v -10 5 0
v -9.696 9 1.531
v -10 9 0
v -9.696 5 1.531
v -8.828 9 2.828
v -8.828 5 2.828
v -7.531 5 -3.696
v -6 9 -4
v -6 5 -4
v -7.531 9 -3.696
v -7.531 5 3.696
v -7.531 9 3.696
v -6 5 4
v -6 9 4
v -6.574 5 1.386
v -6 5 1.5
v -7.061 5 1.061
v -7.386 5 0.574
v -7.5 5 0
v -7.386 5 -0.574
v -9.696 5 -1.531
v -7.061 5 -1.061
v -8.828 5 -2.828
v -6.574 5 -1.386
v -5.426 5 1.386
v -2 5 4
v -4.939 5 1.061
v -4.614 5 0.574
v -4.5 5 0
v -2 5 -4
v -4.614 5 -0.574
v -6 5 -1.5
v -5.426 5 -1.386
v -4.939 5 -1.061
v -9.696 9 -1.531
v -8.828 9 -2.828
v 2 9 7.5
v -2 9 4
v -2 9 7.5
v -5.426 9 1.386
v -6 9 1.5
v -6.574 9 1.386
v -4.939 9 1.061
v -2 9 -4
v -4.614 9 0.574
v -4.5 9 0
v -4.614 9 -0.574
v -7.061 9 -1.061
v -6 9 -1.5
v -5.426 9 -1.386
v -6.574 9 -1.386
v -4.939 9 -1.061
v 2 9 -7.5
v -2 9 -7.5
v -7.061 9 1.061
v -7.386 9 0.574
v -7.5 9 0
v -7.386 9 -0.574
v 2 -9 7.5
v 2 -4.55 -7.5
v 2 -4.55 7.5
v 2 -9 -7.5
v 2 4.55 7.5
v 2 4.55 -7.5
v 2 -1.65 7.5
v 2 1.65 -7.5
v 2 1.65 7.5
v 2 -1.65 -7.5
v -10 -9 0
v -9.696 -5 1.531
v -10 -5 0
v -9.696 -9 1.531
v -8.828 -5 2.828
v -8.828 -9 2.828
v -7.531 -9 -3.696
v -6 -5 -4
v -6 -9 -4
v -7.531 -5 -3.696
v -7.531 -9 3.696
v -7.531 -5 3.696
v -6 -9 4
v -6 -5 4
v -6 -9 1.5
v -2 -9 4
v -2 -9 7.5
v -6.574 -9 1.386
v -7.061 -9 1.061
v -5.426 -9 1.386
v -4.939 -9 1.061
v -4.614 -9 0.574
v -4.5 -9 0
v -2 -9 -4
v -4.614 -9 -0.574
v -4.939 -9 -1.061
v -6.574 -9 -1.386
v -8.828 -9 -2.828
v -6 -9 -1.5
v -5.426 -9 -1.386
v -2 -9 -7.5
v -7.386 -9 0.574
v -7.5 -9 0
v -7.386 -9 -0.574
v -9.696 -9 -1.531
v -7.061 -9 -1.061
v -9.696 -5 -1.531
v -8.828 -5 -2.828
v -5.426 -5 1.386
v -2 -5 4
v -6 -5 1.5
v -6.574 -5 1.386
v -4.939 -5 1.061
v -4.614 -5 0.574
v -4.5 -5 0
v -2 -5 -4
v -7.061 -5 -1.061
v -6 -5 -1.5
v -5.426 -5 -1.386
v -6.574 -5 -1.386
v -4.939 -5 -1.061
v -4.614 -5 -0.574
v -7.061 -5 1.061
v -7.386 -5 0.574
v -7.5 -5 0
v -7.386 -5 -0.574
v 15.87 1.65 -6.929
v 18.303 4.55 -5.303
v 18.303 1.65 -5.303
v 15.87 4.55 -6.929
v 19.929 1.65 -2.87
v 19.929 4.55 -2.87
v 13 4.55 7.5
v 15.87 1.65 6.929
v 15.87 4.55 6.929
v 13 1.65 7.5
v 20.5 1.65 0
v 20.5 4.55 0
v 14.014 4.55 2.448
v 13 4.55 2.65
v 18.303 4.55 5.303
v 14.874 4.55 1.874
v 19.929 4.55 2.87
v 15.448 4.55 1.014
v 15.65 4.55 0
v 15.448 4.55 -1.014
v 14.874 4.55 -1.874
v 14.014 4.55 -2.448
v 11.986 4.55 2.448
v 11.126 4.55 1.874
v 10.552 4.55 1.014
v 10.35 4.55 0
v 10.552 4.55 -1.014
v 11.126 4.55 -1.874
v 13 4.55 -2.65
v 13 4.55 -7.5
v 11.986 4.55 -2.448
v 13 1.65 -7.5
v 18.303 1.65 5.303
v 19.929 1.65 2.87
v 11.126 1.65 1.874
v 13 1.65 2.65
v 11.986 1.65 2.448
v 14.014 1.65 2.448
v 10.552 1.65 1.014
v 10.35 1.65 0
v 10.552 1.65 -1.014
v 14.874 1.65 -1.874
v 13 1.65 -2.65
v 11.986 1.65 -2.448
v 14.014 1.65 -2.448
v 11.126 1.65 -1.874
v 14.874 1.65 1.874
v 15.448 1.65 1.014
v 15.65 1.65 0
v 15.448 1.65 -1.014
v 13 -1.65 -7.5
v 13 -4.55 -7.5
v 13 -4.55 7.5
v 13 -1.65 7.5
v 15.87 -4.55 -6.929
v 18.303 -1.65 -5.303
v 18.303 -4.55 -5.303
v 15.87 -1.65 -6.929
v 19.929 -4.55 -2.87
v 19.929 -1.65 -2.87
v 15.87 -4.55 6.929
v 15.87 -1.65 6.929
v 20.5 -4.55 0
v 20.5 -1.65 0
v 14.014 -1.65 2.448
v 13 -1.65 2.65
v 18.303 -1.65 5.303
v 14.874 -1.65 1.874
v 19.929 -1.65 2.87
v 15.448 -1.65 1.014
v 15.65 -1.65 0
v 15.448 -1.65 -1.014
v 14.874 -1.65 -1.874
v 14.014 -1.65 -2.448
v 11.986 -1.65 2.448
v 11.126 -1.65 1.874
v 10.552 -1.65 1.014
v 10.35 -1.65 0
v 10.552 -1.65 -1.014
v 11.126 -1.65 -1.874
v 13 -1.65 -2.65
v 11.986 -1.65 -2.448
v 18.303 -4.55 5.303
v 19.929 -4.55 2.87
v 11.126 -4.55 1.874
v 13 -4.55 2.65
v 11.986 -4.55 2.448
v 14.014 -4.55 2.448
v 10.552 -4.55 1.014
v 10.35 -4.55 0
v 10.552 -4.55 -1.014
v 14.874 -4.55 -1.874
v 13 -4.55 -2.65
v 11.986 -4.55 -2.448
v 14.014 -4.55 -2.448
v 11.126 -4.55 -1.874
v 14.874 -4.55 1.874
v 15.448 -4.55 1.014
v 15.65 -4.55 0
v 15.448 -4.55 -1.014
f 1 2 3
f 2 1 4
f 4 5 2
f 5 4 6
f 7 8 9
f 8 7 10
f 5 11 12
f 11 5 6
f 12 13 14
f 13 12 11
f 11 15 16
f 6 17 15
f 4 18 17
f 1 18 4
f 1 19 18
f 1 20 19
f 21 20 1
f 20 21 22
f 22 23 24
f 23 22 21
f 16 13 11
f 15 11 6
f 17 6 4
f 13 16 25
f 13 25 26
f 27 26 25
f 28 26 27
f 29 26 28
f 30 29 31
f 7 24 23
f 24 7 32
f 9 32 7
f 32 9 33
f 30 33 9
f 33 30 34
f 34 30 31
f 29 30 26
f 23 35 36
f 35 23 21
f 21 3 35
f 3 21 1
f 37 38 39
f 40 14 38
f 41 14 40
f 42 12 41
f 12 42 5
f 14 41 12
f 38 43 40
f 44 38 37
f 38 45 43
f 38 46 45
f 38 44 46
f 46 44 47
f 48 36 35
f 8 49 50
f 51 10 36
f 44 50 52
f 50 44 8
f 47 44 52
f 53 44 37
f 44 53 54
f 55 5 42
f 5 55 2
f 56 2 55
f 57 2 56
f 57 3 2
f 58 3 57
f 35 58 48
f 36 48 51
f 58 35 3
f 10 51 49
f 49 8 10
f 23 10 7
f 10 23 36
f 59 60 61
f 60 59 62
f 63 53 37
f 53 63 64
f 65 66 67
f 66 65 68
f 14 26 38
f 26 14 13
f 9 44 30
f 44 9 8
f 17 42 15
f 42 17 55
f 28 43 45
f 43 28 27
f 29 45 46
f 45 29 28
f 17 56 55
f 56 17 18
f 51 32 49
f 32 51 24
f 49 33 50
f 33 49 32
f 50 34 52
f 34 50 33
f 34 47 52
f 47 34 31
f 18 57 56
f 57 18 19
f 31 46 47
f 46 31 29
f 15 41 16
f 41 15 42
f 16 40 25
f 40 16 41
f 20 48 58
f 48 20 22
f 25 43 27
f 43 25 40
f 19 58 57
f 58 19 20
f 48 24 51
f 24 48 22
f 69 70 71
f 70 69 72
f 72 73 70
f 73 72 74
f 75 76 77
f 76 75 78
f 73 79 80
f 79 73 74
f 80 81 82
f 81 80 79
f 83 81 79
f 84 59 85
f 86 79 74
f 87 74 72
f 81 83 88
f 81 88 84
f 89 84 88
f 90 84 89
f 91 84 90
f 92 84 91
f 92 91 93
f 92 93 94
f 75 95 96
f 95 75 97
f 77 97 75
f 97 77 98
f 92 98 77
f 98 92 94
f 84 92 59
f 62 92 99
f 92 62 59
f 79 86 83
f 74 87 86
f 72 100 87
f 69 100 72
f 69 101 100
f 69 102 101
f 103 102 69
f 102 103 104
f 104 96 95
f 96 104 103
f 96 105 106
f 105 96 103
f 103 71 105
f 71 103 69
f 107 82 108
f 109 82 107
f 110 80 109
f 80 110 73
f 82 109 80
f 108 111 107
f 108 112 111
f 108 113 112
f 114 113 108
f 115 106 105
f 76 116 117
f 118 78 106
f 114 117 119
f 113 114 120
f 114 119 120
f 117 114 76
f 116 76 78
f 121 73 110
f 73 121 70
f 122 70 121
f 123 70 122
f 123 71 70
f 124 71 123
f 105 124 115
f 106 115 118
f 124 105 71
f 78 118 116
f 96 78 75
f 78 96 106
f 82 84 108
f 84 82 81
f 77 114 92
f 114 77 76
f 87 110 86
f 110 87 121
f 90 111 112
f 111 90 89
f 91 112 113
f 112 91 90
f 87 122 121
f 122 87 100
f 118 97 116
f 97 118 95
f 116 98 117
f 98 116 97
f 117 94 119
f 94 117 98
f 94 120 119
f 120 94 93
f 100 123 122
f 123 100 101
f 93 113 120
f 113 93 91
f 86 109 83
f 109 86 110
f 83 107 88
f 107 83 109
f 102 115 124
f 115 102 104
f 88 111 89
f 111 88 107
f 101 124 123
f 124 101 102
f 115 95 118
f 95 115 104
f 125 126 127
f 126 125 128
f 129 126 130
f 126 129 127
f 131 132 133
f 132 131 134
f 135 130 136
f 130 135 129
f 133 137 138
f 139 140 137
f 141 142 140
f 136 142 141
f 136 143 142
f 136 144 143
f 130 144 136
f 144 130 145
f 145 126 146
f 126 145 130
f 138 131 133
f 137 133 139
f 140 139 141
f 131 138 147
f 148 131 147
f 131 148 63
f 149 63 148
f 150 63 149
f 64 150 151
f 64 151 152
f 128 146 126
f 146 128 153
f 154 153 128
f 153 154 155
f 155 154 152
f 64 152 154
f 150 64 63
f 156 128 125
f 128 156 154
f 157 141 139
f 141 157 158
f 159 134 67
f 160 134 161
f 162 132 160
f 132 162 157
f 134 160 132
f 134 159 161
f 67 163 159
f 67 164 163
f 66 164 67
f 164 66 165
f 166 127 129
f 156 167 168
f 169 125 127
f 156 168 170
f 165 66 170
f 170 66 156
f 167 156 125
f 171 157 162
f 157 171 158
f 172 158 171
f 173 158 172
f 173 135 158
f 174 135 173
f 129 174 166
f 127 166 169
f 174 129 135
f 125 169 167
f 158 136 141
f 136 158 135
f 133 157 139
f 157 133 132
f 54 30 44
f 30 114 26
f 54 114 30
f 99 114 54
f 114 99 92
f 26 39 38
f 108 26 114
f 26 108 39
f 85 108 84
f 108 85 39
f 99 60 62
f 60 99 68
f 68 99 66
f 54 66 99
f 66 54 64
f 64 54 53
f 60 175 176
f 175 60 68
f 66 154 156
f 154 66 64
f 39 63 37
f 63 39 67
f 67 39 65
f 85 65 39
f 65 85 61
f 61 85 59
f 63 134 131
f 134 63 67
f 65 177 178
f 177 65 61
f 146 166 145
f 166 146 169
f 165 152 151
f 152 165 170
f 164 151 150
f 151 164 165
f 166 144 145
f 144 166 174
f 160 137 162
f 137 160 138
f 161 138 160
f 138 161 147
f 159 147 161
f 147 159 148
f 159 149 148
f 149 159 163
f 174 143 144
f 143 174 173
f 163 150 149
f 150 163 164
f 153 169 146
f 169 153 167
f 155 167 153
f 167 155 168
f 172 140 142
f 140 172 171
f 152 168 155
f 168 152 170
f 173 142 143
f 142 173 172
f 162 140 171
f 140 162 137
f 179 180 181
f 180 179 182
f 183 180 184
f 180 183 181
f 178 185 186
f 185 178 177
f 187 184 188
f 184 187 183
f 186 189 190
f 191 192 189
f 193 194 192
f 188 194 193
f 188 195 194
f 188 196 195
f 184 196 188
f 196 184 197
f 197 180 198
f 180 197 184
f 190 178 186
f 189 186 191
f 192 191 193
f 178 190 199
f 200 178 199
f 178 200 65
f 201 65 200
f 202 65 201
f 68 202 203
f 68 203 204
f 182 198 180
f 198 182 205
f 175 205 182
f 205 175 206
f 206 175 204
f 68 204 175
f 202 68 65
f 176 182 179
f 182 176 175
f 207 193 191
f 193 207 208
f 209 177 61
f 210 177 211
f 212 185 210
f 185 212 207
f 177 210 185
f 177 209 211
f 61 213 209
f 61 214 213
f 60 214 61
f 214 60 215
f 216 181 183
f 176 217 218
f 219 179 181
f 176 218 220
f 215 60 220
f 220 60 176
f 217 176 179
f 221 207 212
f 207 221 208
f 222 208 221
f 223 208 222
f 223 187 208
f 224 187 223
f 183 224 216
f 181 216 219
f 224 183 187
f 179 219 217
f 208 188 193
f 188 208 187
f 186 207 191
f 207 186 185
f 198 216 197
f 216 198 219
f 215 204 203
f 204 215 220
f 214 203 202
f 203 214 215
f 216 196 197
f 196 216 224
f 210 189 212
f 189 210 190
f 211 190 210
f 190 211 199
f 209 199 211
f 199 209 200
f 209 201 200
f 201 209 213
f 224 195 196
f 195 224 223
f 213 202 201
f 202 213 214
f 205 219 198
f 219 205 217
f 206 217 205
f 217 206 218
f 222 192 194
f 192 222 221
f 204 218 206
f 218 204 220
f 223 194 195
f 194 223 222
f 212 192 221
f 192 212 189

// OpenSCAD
// GoPro-like connector adapter
// Version 1
//
// Adapter to connect a GoPro connector to something else in similar shape.
//
// Each side of the adapter consists of a number of legs that end in a semicircle and
// have a hole in the middle. The geometry can be specified for each side (see variable 
// definitions in the code below).
//
// For printing, supports must be used, especially if the outer radii of both sides differ. 
//
// Copyright (c) 2021 regenschein71
// https://github.com/regenschein71/gopro-adapter

/////////////////////////////////////////////////////////////
// Edit geometry here
/////////////////////////////////////////////////////////////

// Thickness of the plate connecting the parts
baseThickness = 4;

// Geometry of first side

// Number of legs on side 1
numLegs1 = 2;

// Outer radius (or half-width) of the legs on side 1
outerRadius1 = 4.0;

// Radius of the inner whole in the legs on side 1
innerRadius1 = 1.5;

// Thickness of each leg on side 1
legThickness1 = 4.0;

// Distance between the legs on side 1
legSpacing1 = 10.0;

// Geometry of second  side
// The predefined values fit a GoPro mount.

// Number of legs on side 2
numLegs2 = 2;

// Outer radius (or half-width) of the legs on side 2
outerRadius2 = 7.5;

// Radius of the inner whole in the legs on side 2
innerRadius2 = 2.65;

// Thickness of each leg on side 2
legThickness2 = 2.9;

// Distance between the legs on side 2
legSpacing2 = 3.3;


/////////////////////////////////////////////////////////////
// Nothing more to edit here
/////////////////////////////////////////////////////////////

// Main program

// Rotate to printing position, legs spaced along the y-axis
rotate ([90,0,0]) {
    union() {
        // Create first side
        side(numLegs1, outerRadius1, innerRadius1, legThickness1, legSpacing1);
        
        // Create other side, rotate to extend in -x direction
        rotate ([0,0,180]) side(numLegs2, outerRadius2, innerRadius2, legThickness2, legSpacing2);
        
        maxWidth=max(outerRadius1, outerRadius2);
        maxHeight=max(height(numLegs1, legThickness1, legSpacing1), height(numLegs2, legThickness2, legSpacing2));
        
        // Connecting base plate
        cube ([baseThickness, 2 *maxWidth, maxHeight], true);
    }
}

// Create one side of the adapter with the specified number of legs and spacing
// The result is aligned with the legs stacked vertically and the base plate centered on the y-axis
module side(numLegs=2, outer=2, inner=1, thickness=1,space=1) {
    
    // Distance between the outside surfaces of the outermost legs
    totalHeight = height(numLegs, thickness, space);
    
    // Offset for positioning the legs vertically
    totalHeightOffset = ((numLegs - 1) * (thickness + space)) / 2;
        
    translate ([-(2*outer -baseThickness/2) ,0,0]) 
        union() {
            for (i=[1:numLegs]) {
                vOffset=(thickness + space) * (i-1);
                translate ([0,0,vOffset - totalHeightOffset]) leg(outer, inner, thickness);
            }
        }
}

// Create one leg, consisting of a circle and a box, with a hole in the circle
// The leg will be centered on the origin with the circles' center and aligned
// on the x/y-axis
module leg(outer=2, inner=1, thickness=1) {
       difference() {
            union() {
                cylinder(thickness,outer,outer,true,$fn=16);
                translate ([outer,0,0]) cube([2 * outer,2 * outer, thickness], true);
            }    
            cylinder(thickness * 1.1,inner, inner,true,$fn=16);
    }
}

// Calculate total height of the specified legs
function height(numLegs=1,thickness=1, space=1) = (numLegs  * thickness + (numLegs - 1) * space);   
